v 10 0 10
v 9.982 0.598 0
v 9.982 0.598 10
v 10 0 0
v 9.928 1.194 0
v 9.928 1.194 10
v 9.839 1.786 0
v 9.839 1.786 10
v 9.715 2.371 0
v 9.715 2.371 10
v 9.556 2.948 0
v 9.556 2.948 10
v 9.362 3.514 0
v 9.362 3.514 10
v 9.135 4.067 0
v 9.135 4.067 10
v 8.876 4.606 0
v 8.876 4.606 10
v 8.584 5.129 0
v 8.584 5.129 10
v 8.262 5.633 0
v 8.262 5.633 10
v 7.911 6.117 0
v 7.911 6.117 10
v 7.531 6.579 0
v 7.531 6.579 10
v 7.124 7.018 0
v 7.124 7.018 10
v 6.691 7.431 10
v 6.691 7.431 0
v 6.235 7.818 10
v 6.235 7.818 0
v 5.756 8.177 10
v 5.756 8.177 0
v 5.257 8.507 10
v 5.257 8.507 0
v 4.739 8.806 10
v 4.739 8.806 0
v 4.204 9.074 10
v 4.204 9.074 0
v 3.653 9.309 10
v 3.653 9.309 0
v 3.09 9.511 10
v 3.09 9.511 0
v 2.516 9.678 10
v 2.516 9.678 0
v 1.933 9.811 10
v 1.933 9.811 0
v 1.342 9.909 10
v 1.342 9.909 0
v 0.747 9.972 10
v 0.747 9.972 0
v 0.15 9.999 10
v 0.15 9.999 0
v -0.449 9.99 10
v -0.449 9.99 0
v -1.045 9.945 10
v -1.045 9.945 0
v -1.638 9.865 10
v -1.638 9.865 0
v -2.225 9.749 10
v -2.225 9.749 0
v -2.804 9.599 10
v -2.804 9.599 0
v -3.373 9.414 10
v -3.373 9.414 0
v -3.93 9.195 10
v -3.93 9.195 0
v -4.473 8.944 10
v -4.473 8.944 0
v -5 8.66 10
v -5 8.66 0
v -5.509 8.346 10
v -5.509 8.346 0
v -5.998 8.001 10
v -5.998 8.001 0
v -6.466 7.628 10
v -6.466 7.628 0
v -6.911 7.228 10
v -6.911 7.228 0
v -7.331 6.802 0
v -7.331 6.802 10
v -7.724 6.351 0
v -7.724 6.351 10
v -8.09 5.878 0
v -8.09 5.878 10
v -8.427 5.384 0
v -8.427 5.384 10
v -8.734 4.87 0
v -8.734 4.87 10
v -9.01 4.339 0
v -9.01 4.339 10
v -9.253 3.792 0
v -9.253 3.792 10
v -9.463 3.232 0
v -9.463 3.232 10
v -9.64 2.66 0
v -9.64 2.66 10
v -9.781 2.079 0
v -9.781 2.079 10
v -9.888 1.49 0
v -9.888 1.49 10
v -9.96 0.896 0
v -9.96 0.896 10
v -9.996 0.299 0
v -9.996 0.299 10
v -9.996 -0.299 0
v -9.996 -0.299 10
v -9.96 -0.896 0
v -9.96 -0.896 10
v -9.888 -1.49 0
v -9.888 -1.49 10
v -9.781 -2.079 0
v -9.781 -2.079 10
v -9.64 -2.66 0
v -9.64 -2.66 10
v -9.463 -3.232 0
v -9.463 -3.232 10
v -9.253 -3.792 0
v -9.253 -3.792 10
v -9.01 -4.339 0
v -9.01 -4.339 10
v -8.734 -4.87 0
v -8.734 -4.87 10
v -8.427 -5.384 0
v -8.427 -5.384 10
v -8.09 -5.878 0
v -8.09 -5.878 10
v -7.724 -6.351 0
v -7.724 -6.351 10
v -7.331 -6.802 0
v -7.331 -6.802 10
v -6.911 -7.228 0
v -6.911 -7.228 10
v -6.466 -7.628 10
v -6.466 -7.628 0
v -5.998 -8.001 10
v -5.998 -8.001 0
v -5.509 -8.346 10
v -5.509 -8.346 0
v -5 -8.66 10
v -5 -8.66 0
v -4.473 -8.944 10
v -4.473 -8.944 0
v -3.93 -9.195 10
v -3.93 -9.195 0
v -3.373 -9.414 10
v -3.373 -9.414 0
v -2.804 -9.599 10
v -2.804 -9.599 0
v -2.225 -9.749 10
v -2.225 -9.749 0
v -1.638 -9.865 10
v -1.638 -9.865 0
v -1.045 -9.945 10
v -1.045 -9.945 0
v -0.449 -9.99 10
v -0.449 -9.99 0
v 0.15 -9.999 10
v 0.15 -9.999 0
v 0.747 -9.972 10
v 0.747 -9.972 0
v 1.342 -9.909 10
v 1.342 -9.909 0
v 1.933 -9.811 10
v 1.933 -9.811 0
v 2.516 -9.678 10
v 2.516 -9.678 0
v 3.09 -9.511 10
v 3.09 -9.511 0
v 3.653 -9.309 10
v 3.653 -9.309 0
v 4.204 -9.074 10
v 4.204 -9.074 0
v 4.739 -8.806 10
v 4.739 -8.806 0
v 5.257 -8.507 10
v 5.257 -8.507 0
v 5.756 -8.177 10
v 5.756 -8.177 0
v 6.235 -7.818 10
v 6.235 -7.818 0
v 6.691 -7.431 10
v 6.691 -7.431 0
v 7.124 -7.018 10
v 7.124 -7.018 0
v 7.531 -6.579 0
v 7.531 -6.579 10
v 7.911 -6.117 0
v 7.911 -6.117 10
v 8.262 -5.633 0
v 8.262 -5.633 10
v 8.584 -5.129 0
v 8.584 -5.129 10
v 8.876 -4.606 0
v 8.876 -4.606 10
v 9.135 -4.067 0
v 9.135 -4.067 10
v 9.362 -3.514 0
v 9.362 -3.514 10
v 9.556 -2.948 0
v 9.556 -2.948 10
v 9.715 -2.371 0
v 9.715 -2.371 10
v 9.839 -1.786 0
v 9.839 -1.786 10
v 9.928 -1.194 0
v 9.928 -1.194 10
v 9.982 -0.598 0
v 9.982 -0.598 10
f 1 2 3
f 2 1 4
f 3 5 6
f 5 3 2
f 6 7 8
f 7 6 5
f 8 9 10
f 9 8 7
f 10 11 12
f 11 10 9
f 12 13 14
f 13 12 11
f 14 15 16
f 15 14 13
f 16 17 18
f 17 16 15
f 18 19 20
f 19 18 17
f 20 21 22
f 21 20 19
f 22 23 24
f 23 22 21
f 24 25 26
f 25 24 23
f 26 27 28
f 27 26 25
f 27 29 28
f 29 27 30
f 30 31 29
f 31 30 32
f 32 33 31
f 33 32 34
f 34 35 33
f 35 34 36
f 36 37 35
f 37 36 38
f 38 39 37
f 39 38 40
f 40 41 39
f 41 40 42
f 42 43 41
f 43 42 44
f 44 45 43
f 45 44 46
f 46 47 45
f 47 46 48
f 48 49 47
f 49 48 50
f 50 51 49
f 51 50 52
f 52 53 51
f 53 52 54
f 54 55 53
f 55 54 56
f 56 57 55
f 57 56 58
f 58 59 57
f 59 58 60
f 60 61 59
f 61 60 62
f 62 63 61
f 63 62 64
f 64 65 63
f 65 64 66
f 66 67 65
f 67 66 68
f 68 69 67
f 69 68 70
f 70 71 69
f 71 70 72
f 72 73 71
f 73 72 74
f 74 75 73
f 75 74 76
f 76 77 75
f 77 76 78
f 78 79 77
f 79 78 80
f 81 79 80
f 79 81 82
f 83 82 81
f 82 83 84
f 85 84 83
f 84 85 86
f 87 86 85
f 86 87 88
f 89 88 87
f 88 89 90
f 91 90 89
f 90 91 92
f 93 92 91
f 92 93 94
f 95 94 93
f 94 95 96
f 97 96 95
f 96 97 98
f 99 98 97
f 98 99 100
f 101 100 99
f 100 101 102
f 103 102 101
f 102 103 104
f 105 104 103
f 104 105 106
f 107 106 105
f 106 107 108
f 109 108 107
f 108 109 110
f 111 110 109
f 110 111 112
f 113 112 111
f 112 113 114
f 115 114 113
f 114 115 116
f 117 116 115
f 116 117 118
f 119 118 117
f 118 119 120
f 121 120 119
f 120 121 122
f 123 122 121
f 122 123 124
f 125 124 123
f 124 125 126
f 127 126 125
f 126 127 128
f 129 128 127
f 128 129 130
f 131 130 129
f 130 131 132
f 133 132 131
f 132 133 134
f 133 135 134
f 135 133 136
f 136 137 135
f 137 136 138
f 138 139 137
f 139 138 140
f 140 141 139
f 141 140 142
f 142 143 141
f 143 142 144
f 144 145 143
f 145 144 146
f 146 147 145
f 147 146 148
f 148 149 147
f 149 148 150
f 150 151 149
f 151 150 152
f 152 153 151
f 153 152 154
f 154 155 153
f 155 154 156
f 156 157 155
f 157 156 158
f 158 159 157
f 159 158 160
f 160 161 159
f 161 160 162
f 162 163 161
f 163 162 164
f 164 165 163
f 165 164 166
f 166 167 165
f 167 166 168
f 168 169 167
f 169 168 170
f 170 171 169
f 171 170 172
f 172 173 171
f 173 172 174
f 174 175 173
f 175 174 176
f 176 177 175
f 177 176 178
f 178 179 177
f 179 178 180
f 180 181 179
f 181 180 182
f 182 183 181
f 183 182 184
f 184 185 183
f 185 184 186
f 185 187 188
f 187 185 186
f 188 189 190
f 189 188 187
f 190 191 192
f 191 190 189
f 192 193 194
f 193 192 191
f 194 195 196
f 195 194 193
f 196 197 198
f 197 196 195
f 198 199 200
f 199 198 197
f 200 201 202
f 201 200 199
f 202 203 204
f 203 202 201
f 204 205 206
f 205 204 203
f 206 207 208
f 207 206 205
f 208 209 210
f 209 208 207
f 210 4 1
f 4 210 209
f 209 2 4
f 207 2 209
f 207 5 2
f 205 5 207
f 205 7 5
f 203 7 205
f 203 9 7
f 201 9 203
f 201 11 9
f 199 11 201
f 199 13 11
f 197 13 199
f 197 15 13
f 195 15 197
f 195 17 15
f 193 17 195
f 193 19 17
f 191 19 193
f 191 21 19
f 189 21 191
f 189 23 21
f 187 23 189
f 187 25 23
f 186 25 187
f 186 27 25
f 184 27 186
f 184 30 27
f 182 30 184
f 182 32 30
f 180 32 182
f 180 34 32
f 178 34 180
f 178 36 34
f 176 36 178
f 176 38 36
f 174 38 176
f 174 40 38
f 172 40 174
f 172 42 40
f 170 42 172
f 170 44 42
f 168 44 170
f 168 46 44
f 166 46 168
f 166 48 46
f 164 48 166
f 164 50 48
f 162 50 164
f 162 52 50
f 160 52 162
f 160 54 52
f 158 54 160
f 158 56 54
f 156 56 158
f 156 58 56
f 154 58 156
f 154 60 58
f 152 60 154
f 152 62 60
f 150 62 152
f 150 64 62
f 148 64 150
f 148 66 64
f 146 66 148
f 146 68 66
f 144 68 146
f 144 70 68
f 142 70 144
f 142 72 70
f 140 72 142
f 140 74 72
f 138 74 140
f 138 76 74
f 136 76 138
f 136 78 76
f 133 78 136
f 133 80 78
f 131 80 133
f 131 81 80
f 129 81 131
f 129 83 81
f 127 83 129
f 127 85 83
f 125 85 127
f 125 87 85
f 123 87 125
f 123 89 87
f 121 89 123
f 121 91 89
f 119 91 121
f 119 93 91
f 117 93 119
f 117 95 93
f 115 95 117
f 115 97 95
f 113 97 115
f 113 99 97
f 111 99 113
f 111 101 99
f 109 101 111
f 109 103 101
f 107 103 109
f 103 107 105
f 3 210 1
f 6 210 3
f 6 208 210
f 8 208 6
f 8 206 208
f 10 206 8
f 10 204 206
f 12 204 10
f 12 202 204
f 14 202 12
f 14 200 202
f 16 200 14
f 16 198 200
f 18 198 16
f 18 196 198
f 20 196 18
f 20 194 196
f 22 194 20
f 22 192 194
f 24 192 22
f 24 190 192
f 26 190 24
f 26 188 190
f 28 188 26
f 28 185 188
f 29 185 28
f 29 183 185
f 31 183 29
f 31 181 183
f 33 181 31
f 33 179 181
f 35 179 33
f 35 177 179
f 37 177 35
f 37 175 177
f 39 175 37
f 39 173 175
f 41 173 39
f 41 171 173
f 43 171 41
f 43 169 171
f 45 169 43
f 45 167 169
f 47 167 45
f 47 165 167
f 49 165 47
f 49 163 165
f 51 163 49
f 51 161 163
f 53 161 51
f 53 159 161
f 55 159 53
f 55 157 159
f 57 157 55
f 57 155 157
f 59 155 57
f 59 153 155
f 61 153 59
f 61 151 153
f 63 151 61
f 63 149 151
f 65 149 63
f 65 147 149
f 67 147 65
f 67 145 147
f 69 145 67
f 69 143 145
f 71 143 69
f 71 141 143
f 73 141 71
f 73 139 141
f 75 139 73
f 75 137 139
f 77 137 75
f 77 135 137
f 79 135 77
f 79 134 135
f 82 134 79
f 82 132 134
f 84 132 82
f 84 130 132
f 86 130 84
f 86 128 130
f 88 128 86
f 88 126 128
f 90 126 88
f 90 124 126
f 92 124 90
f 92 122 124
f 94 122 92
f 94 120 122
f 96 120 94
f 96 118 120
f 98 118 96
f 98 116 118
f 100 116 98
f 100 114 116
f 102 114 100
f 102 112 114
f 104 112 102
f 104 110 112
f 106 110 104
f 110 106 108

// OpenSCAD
// Jim Samson
// Nut Holder

$fa=1;
$fs=0.6;

// Unit conversions
InchesToMm=25.4;

// Bolt size measurements
boltSize=(1/2)*InchesToMm;
boltDiameter=(5/16)*InchesToMm;
boltHeight=(5/2)*InchesToMm;

// Bolt Cap Sizes
capDiameter=20;
capHeight=1*InchesToMm;

cap();

module cap() {
    union() {
        capCylinder();
    }
}

module capCylinder() {
    cylinder(r=10,h=10);
}
